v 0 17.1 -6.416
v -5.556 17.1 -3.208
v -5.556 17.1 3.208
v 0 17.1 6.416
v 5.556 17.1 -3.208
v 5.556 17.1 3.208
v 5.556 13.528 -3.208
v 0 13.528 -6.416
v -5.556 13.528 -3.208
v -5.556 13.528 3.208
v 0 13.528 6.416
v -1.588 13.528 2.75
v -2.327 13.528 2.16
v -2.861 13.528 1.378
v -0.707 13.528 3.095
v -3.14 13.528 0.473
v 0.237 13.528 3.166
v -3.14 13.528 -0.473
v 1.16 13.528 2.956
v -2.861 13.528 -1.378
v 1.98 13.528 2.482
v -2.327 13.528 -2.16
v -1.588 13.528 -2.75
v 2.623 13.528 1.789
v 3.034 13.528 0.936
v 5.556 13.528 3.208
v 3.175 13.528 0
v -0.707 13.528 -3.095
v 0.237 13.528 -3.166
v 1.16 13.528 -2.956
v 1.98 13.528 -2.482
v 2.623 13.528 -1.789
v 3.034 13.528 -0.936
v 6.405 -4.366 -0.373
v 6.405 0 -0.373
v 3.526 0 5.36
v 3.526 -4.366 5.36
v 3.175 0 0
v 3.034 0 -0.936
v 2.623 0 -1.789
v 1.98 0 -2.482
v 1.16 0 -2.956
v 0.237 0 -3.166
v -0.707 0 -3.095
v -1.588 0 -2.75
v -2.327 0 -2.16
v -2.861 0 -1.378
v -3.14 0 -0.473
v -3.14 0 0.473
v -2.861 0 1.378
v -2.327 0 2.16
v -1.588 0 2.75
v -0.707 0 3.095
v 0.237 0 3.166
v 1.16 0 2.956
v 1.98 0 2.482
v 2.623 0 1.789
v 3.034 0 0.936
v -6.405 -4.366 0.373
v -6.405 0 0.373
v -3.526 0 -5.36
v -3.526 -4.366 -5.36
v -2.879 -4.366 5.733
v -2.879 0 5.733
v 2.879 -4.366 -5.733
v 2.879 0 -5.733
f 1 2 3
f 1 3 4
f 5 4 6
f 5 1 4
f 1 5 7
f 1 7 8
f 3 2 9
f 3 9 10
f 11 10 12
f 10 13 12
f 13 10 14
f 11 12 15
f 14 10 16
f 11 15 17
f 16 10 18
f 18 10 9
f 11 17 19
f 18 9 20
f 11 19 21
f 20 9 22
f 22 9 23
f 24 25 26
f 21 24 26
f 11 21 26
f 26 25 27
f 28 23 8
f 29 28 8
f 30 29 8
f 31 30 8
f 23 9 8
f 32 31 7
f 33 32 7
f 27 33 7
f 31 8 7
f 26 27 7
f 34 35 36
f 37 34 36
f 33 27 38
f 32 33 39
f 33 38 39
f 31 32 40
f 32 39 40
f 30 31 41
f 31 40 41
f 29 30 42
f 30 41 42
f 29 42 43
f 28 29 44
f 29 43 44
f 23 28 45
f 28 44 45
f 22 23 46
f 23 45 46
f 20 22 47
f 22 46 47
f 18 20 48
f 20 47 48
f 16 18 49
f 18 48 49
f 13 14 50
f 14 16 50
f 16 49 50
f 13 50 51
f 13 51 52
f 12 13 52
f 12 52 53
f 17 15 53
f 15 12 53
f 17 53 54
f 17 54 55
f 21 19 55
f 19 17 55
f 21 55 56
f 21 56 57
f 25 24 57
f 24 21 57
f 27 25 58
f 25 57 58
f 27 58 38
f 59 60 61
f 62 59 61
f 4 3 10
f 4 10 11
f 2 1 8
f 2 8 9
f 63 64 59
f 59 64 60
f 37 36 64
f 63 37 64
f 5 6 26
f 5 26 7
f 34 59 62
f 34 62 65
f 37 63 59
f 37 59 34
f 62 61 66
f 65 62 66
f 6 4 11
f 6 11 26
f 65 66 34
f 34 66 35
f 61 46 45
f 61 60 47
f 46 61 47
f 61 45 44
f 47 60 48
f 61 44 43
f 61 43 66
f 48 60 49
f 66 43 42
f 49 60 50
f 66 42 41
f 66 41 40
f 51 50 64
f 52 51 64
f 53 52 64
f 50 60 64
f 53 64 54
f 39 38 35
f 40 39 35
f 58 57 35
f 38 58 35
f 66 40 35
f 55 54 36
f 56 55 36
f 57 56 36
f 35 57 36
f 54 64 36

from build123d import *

# Parameters (mm, degrees)
SKETCH1_R           = 3.175
BOSS_EXTRUDE1_DEPTH = 17.1
BOSS_EXTRUDE2_DEPTH = 4.365625
BOSS_EXTRUDE3_DEPTH = 3.571875


with BuildPart() as part:
    # Sketch1 → Boss-Extrude1 (new body)
    with BuildSketch(Plane(origin=(0, 0, 0), x_dir=(1, 0, 0), z_dir=(0, 1, 0))):
        Circle(SKETCH1_R)
    extrude(amount=BOSS_EXTRUDE1_DEPTH)

    # Sketch2 → Boss-Extrude2 (add)
    with BuildSketch(Plane.XZ):
        Polygon((6.404947556, -0.373093671), (3.525582375, 5.360300458), (-2.879365181, 5.733394129), (-6.404947556, 0.373093671), (-3.525582375, -5.360300458), (2.879365181, -5.733394129), align=None)
    extrude(amount=BOSS_EXTRUDE2_DEPTH)

    # Sketch3 → Boss-Extrude3 (add)
    with BuildSketch(Plane(origin=(0, 17.1, 0), x_dir=(1, 0, 0), z_dir=(0, 1, 0))):
        Polygon((0, 6.415804866), (-5.55625, 3.207902433), (-5.55625, -3.207902433), (0, -6.415804866), (5.55625, -3.207902433), (5.55625, 3.207902433), align=None)
    extrude(amount=-BOSS_EXTRUDE3_DEPTH)


solid = part.part
